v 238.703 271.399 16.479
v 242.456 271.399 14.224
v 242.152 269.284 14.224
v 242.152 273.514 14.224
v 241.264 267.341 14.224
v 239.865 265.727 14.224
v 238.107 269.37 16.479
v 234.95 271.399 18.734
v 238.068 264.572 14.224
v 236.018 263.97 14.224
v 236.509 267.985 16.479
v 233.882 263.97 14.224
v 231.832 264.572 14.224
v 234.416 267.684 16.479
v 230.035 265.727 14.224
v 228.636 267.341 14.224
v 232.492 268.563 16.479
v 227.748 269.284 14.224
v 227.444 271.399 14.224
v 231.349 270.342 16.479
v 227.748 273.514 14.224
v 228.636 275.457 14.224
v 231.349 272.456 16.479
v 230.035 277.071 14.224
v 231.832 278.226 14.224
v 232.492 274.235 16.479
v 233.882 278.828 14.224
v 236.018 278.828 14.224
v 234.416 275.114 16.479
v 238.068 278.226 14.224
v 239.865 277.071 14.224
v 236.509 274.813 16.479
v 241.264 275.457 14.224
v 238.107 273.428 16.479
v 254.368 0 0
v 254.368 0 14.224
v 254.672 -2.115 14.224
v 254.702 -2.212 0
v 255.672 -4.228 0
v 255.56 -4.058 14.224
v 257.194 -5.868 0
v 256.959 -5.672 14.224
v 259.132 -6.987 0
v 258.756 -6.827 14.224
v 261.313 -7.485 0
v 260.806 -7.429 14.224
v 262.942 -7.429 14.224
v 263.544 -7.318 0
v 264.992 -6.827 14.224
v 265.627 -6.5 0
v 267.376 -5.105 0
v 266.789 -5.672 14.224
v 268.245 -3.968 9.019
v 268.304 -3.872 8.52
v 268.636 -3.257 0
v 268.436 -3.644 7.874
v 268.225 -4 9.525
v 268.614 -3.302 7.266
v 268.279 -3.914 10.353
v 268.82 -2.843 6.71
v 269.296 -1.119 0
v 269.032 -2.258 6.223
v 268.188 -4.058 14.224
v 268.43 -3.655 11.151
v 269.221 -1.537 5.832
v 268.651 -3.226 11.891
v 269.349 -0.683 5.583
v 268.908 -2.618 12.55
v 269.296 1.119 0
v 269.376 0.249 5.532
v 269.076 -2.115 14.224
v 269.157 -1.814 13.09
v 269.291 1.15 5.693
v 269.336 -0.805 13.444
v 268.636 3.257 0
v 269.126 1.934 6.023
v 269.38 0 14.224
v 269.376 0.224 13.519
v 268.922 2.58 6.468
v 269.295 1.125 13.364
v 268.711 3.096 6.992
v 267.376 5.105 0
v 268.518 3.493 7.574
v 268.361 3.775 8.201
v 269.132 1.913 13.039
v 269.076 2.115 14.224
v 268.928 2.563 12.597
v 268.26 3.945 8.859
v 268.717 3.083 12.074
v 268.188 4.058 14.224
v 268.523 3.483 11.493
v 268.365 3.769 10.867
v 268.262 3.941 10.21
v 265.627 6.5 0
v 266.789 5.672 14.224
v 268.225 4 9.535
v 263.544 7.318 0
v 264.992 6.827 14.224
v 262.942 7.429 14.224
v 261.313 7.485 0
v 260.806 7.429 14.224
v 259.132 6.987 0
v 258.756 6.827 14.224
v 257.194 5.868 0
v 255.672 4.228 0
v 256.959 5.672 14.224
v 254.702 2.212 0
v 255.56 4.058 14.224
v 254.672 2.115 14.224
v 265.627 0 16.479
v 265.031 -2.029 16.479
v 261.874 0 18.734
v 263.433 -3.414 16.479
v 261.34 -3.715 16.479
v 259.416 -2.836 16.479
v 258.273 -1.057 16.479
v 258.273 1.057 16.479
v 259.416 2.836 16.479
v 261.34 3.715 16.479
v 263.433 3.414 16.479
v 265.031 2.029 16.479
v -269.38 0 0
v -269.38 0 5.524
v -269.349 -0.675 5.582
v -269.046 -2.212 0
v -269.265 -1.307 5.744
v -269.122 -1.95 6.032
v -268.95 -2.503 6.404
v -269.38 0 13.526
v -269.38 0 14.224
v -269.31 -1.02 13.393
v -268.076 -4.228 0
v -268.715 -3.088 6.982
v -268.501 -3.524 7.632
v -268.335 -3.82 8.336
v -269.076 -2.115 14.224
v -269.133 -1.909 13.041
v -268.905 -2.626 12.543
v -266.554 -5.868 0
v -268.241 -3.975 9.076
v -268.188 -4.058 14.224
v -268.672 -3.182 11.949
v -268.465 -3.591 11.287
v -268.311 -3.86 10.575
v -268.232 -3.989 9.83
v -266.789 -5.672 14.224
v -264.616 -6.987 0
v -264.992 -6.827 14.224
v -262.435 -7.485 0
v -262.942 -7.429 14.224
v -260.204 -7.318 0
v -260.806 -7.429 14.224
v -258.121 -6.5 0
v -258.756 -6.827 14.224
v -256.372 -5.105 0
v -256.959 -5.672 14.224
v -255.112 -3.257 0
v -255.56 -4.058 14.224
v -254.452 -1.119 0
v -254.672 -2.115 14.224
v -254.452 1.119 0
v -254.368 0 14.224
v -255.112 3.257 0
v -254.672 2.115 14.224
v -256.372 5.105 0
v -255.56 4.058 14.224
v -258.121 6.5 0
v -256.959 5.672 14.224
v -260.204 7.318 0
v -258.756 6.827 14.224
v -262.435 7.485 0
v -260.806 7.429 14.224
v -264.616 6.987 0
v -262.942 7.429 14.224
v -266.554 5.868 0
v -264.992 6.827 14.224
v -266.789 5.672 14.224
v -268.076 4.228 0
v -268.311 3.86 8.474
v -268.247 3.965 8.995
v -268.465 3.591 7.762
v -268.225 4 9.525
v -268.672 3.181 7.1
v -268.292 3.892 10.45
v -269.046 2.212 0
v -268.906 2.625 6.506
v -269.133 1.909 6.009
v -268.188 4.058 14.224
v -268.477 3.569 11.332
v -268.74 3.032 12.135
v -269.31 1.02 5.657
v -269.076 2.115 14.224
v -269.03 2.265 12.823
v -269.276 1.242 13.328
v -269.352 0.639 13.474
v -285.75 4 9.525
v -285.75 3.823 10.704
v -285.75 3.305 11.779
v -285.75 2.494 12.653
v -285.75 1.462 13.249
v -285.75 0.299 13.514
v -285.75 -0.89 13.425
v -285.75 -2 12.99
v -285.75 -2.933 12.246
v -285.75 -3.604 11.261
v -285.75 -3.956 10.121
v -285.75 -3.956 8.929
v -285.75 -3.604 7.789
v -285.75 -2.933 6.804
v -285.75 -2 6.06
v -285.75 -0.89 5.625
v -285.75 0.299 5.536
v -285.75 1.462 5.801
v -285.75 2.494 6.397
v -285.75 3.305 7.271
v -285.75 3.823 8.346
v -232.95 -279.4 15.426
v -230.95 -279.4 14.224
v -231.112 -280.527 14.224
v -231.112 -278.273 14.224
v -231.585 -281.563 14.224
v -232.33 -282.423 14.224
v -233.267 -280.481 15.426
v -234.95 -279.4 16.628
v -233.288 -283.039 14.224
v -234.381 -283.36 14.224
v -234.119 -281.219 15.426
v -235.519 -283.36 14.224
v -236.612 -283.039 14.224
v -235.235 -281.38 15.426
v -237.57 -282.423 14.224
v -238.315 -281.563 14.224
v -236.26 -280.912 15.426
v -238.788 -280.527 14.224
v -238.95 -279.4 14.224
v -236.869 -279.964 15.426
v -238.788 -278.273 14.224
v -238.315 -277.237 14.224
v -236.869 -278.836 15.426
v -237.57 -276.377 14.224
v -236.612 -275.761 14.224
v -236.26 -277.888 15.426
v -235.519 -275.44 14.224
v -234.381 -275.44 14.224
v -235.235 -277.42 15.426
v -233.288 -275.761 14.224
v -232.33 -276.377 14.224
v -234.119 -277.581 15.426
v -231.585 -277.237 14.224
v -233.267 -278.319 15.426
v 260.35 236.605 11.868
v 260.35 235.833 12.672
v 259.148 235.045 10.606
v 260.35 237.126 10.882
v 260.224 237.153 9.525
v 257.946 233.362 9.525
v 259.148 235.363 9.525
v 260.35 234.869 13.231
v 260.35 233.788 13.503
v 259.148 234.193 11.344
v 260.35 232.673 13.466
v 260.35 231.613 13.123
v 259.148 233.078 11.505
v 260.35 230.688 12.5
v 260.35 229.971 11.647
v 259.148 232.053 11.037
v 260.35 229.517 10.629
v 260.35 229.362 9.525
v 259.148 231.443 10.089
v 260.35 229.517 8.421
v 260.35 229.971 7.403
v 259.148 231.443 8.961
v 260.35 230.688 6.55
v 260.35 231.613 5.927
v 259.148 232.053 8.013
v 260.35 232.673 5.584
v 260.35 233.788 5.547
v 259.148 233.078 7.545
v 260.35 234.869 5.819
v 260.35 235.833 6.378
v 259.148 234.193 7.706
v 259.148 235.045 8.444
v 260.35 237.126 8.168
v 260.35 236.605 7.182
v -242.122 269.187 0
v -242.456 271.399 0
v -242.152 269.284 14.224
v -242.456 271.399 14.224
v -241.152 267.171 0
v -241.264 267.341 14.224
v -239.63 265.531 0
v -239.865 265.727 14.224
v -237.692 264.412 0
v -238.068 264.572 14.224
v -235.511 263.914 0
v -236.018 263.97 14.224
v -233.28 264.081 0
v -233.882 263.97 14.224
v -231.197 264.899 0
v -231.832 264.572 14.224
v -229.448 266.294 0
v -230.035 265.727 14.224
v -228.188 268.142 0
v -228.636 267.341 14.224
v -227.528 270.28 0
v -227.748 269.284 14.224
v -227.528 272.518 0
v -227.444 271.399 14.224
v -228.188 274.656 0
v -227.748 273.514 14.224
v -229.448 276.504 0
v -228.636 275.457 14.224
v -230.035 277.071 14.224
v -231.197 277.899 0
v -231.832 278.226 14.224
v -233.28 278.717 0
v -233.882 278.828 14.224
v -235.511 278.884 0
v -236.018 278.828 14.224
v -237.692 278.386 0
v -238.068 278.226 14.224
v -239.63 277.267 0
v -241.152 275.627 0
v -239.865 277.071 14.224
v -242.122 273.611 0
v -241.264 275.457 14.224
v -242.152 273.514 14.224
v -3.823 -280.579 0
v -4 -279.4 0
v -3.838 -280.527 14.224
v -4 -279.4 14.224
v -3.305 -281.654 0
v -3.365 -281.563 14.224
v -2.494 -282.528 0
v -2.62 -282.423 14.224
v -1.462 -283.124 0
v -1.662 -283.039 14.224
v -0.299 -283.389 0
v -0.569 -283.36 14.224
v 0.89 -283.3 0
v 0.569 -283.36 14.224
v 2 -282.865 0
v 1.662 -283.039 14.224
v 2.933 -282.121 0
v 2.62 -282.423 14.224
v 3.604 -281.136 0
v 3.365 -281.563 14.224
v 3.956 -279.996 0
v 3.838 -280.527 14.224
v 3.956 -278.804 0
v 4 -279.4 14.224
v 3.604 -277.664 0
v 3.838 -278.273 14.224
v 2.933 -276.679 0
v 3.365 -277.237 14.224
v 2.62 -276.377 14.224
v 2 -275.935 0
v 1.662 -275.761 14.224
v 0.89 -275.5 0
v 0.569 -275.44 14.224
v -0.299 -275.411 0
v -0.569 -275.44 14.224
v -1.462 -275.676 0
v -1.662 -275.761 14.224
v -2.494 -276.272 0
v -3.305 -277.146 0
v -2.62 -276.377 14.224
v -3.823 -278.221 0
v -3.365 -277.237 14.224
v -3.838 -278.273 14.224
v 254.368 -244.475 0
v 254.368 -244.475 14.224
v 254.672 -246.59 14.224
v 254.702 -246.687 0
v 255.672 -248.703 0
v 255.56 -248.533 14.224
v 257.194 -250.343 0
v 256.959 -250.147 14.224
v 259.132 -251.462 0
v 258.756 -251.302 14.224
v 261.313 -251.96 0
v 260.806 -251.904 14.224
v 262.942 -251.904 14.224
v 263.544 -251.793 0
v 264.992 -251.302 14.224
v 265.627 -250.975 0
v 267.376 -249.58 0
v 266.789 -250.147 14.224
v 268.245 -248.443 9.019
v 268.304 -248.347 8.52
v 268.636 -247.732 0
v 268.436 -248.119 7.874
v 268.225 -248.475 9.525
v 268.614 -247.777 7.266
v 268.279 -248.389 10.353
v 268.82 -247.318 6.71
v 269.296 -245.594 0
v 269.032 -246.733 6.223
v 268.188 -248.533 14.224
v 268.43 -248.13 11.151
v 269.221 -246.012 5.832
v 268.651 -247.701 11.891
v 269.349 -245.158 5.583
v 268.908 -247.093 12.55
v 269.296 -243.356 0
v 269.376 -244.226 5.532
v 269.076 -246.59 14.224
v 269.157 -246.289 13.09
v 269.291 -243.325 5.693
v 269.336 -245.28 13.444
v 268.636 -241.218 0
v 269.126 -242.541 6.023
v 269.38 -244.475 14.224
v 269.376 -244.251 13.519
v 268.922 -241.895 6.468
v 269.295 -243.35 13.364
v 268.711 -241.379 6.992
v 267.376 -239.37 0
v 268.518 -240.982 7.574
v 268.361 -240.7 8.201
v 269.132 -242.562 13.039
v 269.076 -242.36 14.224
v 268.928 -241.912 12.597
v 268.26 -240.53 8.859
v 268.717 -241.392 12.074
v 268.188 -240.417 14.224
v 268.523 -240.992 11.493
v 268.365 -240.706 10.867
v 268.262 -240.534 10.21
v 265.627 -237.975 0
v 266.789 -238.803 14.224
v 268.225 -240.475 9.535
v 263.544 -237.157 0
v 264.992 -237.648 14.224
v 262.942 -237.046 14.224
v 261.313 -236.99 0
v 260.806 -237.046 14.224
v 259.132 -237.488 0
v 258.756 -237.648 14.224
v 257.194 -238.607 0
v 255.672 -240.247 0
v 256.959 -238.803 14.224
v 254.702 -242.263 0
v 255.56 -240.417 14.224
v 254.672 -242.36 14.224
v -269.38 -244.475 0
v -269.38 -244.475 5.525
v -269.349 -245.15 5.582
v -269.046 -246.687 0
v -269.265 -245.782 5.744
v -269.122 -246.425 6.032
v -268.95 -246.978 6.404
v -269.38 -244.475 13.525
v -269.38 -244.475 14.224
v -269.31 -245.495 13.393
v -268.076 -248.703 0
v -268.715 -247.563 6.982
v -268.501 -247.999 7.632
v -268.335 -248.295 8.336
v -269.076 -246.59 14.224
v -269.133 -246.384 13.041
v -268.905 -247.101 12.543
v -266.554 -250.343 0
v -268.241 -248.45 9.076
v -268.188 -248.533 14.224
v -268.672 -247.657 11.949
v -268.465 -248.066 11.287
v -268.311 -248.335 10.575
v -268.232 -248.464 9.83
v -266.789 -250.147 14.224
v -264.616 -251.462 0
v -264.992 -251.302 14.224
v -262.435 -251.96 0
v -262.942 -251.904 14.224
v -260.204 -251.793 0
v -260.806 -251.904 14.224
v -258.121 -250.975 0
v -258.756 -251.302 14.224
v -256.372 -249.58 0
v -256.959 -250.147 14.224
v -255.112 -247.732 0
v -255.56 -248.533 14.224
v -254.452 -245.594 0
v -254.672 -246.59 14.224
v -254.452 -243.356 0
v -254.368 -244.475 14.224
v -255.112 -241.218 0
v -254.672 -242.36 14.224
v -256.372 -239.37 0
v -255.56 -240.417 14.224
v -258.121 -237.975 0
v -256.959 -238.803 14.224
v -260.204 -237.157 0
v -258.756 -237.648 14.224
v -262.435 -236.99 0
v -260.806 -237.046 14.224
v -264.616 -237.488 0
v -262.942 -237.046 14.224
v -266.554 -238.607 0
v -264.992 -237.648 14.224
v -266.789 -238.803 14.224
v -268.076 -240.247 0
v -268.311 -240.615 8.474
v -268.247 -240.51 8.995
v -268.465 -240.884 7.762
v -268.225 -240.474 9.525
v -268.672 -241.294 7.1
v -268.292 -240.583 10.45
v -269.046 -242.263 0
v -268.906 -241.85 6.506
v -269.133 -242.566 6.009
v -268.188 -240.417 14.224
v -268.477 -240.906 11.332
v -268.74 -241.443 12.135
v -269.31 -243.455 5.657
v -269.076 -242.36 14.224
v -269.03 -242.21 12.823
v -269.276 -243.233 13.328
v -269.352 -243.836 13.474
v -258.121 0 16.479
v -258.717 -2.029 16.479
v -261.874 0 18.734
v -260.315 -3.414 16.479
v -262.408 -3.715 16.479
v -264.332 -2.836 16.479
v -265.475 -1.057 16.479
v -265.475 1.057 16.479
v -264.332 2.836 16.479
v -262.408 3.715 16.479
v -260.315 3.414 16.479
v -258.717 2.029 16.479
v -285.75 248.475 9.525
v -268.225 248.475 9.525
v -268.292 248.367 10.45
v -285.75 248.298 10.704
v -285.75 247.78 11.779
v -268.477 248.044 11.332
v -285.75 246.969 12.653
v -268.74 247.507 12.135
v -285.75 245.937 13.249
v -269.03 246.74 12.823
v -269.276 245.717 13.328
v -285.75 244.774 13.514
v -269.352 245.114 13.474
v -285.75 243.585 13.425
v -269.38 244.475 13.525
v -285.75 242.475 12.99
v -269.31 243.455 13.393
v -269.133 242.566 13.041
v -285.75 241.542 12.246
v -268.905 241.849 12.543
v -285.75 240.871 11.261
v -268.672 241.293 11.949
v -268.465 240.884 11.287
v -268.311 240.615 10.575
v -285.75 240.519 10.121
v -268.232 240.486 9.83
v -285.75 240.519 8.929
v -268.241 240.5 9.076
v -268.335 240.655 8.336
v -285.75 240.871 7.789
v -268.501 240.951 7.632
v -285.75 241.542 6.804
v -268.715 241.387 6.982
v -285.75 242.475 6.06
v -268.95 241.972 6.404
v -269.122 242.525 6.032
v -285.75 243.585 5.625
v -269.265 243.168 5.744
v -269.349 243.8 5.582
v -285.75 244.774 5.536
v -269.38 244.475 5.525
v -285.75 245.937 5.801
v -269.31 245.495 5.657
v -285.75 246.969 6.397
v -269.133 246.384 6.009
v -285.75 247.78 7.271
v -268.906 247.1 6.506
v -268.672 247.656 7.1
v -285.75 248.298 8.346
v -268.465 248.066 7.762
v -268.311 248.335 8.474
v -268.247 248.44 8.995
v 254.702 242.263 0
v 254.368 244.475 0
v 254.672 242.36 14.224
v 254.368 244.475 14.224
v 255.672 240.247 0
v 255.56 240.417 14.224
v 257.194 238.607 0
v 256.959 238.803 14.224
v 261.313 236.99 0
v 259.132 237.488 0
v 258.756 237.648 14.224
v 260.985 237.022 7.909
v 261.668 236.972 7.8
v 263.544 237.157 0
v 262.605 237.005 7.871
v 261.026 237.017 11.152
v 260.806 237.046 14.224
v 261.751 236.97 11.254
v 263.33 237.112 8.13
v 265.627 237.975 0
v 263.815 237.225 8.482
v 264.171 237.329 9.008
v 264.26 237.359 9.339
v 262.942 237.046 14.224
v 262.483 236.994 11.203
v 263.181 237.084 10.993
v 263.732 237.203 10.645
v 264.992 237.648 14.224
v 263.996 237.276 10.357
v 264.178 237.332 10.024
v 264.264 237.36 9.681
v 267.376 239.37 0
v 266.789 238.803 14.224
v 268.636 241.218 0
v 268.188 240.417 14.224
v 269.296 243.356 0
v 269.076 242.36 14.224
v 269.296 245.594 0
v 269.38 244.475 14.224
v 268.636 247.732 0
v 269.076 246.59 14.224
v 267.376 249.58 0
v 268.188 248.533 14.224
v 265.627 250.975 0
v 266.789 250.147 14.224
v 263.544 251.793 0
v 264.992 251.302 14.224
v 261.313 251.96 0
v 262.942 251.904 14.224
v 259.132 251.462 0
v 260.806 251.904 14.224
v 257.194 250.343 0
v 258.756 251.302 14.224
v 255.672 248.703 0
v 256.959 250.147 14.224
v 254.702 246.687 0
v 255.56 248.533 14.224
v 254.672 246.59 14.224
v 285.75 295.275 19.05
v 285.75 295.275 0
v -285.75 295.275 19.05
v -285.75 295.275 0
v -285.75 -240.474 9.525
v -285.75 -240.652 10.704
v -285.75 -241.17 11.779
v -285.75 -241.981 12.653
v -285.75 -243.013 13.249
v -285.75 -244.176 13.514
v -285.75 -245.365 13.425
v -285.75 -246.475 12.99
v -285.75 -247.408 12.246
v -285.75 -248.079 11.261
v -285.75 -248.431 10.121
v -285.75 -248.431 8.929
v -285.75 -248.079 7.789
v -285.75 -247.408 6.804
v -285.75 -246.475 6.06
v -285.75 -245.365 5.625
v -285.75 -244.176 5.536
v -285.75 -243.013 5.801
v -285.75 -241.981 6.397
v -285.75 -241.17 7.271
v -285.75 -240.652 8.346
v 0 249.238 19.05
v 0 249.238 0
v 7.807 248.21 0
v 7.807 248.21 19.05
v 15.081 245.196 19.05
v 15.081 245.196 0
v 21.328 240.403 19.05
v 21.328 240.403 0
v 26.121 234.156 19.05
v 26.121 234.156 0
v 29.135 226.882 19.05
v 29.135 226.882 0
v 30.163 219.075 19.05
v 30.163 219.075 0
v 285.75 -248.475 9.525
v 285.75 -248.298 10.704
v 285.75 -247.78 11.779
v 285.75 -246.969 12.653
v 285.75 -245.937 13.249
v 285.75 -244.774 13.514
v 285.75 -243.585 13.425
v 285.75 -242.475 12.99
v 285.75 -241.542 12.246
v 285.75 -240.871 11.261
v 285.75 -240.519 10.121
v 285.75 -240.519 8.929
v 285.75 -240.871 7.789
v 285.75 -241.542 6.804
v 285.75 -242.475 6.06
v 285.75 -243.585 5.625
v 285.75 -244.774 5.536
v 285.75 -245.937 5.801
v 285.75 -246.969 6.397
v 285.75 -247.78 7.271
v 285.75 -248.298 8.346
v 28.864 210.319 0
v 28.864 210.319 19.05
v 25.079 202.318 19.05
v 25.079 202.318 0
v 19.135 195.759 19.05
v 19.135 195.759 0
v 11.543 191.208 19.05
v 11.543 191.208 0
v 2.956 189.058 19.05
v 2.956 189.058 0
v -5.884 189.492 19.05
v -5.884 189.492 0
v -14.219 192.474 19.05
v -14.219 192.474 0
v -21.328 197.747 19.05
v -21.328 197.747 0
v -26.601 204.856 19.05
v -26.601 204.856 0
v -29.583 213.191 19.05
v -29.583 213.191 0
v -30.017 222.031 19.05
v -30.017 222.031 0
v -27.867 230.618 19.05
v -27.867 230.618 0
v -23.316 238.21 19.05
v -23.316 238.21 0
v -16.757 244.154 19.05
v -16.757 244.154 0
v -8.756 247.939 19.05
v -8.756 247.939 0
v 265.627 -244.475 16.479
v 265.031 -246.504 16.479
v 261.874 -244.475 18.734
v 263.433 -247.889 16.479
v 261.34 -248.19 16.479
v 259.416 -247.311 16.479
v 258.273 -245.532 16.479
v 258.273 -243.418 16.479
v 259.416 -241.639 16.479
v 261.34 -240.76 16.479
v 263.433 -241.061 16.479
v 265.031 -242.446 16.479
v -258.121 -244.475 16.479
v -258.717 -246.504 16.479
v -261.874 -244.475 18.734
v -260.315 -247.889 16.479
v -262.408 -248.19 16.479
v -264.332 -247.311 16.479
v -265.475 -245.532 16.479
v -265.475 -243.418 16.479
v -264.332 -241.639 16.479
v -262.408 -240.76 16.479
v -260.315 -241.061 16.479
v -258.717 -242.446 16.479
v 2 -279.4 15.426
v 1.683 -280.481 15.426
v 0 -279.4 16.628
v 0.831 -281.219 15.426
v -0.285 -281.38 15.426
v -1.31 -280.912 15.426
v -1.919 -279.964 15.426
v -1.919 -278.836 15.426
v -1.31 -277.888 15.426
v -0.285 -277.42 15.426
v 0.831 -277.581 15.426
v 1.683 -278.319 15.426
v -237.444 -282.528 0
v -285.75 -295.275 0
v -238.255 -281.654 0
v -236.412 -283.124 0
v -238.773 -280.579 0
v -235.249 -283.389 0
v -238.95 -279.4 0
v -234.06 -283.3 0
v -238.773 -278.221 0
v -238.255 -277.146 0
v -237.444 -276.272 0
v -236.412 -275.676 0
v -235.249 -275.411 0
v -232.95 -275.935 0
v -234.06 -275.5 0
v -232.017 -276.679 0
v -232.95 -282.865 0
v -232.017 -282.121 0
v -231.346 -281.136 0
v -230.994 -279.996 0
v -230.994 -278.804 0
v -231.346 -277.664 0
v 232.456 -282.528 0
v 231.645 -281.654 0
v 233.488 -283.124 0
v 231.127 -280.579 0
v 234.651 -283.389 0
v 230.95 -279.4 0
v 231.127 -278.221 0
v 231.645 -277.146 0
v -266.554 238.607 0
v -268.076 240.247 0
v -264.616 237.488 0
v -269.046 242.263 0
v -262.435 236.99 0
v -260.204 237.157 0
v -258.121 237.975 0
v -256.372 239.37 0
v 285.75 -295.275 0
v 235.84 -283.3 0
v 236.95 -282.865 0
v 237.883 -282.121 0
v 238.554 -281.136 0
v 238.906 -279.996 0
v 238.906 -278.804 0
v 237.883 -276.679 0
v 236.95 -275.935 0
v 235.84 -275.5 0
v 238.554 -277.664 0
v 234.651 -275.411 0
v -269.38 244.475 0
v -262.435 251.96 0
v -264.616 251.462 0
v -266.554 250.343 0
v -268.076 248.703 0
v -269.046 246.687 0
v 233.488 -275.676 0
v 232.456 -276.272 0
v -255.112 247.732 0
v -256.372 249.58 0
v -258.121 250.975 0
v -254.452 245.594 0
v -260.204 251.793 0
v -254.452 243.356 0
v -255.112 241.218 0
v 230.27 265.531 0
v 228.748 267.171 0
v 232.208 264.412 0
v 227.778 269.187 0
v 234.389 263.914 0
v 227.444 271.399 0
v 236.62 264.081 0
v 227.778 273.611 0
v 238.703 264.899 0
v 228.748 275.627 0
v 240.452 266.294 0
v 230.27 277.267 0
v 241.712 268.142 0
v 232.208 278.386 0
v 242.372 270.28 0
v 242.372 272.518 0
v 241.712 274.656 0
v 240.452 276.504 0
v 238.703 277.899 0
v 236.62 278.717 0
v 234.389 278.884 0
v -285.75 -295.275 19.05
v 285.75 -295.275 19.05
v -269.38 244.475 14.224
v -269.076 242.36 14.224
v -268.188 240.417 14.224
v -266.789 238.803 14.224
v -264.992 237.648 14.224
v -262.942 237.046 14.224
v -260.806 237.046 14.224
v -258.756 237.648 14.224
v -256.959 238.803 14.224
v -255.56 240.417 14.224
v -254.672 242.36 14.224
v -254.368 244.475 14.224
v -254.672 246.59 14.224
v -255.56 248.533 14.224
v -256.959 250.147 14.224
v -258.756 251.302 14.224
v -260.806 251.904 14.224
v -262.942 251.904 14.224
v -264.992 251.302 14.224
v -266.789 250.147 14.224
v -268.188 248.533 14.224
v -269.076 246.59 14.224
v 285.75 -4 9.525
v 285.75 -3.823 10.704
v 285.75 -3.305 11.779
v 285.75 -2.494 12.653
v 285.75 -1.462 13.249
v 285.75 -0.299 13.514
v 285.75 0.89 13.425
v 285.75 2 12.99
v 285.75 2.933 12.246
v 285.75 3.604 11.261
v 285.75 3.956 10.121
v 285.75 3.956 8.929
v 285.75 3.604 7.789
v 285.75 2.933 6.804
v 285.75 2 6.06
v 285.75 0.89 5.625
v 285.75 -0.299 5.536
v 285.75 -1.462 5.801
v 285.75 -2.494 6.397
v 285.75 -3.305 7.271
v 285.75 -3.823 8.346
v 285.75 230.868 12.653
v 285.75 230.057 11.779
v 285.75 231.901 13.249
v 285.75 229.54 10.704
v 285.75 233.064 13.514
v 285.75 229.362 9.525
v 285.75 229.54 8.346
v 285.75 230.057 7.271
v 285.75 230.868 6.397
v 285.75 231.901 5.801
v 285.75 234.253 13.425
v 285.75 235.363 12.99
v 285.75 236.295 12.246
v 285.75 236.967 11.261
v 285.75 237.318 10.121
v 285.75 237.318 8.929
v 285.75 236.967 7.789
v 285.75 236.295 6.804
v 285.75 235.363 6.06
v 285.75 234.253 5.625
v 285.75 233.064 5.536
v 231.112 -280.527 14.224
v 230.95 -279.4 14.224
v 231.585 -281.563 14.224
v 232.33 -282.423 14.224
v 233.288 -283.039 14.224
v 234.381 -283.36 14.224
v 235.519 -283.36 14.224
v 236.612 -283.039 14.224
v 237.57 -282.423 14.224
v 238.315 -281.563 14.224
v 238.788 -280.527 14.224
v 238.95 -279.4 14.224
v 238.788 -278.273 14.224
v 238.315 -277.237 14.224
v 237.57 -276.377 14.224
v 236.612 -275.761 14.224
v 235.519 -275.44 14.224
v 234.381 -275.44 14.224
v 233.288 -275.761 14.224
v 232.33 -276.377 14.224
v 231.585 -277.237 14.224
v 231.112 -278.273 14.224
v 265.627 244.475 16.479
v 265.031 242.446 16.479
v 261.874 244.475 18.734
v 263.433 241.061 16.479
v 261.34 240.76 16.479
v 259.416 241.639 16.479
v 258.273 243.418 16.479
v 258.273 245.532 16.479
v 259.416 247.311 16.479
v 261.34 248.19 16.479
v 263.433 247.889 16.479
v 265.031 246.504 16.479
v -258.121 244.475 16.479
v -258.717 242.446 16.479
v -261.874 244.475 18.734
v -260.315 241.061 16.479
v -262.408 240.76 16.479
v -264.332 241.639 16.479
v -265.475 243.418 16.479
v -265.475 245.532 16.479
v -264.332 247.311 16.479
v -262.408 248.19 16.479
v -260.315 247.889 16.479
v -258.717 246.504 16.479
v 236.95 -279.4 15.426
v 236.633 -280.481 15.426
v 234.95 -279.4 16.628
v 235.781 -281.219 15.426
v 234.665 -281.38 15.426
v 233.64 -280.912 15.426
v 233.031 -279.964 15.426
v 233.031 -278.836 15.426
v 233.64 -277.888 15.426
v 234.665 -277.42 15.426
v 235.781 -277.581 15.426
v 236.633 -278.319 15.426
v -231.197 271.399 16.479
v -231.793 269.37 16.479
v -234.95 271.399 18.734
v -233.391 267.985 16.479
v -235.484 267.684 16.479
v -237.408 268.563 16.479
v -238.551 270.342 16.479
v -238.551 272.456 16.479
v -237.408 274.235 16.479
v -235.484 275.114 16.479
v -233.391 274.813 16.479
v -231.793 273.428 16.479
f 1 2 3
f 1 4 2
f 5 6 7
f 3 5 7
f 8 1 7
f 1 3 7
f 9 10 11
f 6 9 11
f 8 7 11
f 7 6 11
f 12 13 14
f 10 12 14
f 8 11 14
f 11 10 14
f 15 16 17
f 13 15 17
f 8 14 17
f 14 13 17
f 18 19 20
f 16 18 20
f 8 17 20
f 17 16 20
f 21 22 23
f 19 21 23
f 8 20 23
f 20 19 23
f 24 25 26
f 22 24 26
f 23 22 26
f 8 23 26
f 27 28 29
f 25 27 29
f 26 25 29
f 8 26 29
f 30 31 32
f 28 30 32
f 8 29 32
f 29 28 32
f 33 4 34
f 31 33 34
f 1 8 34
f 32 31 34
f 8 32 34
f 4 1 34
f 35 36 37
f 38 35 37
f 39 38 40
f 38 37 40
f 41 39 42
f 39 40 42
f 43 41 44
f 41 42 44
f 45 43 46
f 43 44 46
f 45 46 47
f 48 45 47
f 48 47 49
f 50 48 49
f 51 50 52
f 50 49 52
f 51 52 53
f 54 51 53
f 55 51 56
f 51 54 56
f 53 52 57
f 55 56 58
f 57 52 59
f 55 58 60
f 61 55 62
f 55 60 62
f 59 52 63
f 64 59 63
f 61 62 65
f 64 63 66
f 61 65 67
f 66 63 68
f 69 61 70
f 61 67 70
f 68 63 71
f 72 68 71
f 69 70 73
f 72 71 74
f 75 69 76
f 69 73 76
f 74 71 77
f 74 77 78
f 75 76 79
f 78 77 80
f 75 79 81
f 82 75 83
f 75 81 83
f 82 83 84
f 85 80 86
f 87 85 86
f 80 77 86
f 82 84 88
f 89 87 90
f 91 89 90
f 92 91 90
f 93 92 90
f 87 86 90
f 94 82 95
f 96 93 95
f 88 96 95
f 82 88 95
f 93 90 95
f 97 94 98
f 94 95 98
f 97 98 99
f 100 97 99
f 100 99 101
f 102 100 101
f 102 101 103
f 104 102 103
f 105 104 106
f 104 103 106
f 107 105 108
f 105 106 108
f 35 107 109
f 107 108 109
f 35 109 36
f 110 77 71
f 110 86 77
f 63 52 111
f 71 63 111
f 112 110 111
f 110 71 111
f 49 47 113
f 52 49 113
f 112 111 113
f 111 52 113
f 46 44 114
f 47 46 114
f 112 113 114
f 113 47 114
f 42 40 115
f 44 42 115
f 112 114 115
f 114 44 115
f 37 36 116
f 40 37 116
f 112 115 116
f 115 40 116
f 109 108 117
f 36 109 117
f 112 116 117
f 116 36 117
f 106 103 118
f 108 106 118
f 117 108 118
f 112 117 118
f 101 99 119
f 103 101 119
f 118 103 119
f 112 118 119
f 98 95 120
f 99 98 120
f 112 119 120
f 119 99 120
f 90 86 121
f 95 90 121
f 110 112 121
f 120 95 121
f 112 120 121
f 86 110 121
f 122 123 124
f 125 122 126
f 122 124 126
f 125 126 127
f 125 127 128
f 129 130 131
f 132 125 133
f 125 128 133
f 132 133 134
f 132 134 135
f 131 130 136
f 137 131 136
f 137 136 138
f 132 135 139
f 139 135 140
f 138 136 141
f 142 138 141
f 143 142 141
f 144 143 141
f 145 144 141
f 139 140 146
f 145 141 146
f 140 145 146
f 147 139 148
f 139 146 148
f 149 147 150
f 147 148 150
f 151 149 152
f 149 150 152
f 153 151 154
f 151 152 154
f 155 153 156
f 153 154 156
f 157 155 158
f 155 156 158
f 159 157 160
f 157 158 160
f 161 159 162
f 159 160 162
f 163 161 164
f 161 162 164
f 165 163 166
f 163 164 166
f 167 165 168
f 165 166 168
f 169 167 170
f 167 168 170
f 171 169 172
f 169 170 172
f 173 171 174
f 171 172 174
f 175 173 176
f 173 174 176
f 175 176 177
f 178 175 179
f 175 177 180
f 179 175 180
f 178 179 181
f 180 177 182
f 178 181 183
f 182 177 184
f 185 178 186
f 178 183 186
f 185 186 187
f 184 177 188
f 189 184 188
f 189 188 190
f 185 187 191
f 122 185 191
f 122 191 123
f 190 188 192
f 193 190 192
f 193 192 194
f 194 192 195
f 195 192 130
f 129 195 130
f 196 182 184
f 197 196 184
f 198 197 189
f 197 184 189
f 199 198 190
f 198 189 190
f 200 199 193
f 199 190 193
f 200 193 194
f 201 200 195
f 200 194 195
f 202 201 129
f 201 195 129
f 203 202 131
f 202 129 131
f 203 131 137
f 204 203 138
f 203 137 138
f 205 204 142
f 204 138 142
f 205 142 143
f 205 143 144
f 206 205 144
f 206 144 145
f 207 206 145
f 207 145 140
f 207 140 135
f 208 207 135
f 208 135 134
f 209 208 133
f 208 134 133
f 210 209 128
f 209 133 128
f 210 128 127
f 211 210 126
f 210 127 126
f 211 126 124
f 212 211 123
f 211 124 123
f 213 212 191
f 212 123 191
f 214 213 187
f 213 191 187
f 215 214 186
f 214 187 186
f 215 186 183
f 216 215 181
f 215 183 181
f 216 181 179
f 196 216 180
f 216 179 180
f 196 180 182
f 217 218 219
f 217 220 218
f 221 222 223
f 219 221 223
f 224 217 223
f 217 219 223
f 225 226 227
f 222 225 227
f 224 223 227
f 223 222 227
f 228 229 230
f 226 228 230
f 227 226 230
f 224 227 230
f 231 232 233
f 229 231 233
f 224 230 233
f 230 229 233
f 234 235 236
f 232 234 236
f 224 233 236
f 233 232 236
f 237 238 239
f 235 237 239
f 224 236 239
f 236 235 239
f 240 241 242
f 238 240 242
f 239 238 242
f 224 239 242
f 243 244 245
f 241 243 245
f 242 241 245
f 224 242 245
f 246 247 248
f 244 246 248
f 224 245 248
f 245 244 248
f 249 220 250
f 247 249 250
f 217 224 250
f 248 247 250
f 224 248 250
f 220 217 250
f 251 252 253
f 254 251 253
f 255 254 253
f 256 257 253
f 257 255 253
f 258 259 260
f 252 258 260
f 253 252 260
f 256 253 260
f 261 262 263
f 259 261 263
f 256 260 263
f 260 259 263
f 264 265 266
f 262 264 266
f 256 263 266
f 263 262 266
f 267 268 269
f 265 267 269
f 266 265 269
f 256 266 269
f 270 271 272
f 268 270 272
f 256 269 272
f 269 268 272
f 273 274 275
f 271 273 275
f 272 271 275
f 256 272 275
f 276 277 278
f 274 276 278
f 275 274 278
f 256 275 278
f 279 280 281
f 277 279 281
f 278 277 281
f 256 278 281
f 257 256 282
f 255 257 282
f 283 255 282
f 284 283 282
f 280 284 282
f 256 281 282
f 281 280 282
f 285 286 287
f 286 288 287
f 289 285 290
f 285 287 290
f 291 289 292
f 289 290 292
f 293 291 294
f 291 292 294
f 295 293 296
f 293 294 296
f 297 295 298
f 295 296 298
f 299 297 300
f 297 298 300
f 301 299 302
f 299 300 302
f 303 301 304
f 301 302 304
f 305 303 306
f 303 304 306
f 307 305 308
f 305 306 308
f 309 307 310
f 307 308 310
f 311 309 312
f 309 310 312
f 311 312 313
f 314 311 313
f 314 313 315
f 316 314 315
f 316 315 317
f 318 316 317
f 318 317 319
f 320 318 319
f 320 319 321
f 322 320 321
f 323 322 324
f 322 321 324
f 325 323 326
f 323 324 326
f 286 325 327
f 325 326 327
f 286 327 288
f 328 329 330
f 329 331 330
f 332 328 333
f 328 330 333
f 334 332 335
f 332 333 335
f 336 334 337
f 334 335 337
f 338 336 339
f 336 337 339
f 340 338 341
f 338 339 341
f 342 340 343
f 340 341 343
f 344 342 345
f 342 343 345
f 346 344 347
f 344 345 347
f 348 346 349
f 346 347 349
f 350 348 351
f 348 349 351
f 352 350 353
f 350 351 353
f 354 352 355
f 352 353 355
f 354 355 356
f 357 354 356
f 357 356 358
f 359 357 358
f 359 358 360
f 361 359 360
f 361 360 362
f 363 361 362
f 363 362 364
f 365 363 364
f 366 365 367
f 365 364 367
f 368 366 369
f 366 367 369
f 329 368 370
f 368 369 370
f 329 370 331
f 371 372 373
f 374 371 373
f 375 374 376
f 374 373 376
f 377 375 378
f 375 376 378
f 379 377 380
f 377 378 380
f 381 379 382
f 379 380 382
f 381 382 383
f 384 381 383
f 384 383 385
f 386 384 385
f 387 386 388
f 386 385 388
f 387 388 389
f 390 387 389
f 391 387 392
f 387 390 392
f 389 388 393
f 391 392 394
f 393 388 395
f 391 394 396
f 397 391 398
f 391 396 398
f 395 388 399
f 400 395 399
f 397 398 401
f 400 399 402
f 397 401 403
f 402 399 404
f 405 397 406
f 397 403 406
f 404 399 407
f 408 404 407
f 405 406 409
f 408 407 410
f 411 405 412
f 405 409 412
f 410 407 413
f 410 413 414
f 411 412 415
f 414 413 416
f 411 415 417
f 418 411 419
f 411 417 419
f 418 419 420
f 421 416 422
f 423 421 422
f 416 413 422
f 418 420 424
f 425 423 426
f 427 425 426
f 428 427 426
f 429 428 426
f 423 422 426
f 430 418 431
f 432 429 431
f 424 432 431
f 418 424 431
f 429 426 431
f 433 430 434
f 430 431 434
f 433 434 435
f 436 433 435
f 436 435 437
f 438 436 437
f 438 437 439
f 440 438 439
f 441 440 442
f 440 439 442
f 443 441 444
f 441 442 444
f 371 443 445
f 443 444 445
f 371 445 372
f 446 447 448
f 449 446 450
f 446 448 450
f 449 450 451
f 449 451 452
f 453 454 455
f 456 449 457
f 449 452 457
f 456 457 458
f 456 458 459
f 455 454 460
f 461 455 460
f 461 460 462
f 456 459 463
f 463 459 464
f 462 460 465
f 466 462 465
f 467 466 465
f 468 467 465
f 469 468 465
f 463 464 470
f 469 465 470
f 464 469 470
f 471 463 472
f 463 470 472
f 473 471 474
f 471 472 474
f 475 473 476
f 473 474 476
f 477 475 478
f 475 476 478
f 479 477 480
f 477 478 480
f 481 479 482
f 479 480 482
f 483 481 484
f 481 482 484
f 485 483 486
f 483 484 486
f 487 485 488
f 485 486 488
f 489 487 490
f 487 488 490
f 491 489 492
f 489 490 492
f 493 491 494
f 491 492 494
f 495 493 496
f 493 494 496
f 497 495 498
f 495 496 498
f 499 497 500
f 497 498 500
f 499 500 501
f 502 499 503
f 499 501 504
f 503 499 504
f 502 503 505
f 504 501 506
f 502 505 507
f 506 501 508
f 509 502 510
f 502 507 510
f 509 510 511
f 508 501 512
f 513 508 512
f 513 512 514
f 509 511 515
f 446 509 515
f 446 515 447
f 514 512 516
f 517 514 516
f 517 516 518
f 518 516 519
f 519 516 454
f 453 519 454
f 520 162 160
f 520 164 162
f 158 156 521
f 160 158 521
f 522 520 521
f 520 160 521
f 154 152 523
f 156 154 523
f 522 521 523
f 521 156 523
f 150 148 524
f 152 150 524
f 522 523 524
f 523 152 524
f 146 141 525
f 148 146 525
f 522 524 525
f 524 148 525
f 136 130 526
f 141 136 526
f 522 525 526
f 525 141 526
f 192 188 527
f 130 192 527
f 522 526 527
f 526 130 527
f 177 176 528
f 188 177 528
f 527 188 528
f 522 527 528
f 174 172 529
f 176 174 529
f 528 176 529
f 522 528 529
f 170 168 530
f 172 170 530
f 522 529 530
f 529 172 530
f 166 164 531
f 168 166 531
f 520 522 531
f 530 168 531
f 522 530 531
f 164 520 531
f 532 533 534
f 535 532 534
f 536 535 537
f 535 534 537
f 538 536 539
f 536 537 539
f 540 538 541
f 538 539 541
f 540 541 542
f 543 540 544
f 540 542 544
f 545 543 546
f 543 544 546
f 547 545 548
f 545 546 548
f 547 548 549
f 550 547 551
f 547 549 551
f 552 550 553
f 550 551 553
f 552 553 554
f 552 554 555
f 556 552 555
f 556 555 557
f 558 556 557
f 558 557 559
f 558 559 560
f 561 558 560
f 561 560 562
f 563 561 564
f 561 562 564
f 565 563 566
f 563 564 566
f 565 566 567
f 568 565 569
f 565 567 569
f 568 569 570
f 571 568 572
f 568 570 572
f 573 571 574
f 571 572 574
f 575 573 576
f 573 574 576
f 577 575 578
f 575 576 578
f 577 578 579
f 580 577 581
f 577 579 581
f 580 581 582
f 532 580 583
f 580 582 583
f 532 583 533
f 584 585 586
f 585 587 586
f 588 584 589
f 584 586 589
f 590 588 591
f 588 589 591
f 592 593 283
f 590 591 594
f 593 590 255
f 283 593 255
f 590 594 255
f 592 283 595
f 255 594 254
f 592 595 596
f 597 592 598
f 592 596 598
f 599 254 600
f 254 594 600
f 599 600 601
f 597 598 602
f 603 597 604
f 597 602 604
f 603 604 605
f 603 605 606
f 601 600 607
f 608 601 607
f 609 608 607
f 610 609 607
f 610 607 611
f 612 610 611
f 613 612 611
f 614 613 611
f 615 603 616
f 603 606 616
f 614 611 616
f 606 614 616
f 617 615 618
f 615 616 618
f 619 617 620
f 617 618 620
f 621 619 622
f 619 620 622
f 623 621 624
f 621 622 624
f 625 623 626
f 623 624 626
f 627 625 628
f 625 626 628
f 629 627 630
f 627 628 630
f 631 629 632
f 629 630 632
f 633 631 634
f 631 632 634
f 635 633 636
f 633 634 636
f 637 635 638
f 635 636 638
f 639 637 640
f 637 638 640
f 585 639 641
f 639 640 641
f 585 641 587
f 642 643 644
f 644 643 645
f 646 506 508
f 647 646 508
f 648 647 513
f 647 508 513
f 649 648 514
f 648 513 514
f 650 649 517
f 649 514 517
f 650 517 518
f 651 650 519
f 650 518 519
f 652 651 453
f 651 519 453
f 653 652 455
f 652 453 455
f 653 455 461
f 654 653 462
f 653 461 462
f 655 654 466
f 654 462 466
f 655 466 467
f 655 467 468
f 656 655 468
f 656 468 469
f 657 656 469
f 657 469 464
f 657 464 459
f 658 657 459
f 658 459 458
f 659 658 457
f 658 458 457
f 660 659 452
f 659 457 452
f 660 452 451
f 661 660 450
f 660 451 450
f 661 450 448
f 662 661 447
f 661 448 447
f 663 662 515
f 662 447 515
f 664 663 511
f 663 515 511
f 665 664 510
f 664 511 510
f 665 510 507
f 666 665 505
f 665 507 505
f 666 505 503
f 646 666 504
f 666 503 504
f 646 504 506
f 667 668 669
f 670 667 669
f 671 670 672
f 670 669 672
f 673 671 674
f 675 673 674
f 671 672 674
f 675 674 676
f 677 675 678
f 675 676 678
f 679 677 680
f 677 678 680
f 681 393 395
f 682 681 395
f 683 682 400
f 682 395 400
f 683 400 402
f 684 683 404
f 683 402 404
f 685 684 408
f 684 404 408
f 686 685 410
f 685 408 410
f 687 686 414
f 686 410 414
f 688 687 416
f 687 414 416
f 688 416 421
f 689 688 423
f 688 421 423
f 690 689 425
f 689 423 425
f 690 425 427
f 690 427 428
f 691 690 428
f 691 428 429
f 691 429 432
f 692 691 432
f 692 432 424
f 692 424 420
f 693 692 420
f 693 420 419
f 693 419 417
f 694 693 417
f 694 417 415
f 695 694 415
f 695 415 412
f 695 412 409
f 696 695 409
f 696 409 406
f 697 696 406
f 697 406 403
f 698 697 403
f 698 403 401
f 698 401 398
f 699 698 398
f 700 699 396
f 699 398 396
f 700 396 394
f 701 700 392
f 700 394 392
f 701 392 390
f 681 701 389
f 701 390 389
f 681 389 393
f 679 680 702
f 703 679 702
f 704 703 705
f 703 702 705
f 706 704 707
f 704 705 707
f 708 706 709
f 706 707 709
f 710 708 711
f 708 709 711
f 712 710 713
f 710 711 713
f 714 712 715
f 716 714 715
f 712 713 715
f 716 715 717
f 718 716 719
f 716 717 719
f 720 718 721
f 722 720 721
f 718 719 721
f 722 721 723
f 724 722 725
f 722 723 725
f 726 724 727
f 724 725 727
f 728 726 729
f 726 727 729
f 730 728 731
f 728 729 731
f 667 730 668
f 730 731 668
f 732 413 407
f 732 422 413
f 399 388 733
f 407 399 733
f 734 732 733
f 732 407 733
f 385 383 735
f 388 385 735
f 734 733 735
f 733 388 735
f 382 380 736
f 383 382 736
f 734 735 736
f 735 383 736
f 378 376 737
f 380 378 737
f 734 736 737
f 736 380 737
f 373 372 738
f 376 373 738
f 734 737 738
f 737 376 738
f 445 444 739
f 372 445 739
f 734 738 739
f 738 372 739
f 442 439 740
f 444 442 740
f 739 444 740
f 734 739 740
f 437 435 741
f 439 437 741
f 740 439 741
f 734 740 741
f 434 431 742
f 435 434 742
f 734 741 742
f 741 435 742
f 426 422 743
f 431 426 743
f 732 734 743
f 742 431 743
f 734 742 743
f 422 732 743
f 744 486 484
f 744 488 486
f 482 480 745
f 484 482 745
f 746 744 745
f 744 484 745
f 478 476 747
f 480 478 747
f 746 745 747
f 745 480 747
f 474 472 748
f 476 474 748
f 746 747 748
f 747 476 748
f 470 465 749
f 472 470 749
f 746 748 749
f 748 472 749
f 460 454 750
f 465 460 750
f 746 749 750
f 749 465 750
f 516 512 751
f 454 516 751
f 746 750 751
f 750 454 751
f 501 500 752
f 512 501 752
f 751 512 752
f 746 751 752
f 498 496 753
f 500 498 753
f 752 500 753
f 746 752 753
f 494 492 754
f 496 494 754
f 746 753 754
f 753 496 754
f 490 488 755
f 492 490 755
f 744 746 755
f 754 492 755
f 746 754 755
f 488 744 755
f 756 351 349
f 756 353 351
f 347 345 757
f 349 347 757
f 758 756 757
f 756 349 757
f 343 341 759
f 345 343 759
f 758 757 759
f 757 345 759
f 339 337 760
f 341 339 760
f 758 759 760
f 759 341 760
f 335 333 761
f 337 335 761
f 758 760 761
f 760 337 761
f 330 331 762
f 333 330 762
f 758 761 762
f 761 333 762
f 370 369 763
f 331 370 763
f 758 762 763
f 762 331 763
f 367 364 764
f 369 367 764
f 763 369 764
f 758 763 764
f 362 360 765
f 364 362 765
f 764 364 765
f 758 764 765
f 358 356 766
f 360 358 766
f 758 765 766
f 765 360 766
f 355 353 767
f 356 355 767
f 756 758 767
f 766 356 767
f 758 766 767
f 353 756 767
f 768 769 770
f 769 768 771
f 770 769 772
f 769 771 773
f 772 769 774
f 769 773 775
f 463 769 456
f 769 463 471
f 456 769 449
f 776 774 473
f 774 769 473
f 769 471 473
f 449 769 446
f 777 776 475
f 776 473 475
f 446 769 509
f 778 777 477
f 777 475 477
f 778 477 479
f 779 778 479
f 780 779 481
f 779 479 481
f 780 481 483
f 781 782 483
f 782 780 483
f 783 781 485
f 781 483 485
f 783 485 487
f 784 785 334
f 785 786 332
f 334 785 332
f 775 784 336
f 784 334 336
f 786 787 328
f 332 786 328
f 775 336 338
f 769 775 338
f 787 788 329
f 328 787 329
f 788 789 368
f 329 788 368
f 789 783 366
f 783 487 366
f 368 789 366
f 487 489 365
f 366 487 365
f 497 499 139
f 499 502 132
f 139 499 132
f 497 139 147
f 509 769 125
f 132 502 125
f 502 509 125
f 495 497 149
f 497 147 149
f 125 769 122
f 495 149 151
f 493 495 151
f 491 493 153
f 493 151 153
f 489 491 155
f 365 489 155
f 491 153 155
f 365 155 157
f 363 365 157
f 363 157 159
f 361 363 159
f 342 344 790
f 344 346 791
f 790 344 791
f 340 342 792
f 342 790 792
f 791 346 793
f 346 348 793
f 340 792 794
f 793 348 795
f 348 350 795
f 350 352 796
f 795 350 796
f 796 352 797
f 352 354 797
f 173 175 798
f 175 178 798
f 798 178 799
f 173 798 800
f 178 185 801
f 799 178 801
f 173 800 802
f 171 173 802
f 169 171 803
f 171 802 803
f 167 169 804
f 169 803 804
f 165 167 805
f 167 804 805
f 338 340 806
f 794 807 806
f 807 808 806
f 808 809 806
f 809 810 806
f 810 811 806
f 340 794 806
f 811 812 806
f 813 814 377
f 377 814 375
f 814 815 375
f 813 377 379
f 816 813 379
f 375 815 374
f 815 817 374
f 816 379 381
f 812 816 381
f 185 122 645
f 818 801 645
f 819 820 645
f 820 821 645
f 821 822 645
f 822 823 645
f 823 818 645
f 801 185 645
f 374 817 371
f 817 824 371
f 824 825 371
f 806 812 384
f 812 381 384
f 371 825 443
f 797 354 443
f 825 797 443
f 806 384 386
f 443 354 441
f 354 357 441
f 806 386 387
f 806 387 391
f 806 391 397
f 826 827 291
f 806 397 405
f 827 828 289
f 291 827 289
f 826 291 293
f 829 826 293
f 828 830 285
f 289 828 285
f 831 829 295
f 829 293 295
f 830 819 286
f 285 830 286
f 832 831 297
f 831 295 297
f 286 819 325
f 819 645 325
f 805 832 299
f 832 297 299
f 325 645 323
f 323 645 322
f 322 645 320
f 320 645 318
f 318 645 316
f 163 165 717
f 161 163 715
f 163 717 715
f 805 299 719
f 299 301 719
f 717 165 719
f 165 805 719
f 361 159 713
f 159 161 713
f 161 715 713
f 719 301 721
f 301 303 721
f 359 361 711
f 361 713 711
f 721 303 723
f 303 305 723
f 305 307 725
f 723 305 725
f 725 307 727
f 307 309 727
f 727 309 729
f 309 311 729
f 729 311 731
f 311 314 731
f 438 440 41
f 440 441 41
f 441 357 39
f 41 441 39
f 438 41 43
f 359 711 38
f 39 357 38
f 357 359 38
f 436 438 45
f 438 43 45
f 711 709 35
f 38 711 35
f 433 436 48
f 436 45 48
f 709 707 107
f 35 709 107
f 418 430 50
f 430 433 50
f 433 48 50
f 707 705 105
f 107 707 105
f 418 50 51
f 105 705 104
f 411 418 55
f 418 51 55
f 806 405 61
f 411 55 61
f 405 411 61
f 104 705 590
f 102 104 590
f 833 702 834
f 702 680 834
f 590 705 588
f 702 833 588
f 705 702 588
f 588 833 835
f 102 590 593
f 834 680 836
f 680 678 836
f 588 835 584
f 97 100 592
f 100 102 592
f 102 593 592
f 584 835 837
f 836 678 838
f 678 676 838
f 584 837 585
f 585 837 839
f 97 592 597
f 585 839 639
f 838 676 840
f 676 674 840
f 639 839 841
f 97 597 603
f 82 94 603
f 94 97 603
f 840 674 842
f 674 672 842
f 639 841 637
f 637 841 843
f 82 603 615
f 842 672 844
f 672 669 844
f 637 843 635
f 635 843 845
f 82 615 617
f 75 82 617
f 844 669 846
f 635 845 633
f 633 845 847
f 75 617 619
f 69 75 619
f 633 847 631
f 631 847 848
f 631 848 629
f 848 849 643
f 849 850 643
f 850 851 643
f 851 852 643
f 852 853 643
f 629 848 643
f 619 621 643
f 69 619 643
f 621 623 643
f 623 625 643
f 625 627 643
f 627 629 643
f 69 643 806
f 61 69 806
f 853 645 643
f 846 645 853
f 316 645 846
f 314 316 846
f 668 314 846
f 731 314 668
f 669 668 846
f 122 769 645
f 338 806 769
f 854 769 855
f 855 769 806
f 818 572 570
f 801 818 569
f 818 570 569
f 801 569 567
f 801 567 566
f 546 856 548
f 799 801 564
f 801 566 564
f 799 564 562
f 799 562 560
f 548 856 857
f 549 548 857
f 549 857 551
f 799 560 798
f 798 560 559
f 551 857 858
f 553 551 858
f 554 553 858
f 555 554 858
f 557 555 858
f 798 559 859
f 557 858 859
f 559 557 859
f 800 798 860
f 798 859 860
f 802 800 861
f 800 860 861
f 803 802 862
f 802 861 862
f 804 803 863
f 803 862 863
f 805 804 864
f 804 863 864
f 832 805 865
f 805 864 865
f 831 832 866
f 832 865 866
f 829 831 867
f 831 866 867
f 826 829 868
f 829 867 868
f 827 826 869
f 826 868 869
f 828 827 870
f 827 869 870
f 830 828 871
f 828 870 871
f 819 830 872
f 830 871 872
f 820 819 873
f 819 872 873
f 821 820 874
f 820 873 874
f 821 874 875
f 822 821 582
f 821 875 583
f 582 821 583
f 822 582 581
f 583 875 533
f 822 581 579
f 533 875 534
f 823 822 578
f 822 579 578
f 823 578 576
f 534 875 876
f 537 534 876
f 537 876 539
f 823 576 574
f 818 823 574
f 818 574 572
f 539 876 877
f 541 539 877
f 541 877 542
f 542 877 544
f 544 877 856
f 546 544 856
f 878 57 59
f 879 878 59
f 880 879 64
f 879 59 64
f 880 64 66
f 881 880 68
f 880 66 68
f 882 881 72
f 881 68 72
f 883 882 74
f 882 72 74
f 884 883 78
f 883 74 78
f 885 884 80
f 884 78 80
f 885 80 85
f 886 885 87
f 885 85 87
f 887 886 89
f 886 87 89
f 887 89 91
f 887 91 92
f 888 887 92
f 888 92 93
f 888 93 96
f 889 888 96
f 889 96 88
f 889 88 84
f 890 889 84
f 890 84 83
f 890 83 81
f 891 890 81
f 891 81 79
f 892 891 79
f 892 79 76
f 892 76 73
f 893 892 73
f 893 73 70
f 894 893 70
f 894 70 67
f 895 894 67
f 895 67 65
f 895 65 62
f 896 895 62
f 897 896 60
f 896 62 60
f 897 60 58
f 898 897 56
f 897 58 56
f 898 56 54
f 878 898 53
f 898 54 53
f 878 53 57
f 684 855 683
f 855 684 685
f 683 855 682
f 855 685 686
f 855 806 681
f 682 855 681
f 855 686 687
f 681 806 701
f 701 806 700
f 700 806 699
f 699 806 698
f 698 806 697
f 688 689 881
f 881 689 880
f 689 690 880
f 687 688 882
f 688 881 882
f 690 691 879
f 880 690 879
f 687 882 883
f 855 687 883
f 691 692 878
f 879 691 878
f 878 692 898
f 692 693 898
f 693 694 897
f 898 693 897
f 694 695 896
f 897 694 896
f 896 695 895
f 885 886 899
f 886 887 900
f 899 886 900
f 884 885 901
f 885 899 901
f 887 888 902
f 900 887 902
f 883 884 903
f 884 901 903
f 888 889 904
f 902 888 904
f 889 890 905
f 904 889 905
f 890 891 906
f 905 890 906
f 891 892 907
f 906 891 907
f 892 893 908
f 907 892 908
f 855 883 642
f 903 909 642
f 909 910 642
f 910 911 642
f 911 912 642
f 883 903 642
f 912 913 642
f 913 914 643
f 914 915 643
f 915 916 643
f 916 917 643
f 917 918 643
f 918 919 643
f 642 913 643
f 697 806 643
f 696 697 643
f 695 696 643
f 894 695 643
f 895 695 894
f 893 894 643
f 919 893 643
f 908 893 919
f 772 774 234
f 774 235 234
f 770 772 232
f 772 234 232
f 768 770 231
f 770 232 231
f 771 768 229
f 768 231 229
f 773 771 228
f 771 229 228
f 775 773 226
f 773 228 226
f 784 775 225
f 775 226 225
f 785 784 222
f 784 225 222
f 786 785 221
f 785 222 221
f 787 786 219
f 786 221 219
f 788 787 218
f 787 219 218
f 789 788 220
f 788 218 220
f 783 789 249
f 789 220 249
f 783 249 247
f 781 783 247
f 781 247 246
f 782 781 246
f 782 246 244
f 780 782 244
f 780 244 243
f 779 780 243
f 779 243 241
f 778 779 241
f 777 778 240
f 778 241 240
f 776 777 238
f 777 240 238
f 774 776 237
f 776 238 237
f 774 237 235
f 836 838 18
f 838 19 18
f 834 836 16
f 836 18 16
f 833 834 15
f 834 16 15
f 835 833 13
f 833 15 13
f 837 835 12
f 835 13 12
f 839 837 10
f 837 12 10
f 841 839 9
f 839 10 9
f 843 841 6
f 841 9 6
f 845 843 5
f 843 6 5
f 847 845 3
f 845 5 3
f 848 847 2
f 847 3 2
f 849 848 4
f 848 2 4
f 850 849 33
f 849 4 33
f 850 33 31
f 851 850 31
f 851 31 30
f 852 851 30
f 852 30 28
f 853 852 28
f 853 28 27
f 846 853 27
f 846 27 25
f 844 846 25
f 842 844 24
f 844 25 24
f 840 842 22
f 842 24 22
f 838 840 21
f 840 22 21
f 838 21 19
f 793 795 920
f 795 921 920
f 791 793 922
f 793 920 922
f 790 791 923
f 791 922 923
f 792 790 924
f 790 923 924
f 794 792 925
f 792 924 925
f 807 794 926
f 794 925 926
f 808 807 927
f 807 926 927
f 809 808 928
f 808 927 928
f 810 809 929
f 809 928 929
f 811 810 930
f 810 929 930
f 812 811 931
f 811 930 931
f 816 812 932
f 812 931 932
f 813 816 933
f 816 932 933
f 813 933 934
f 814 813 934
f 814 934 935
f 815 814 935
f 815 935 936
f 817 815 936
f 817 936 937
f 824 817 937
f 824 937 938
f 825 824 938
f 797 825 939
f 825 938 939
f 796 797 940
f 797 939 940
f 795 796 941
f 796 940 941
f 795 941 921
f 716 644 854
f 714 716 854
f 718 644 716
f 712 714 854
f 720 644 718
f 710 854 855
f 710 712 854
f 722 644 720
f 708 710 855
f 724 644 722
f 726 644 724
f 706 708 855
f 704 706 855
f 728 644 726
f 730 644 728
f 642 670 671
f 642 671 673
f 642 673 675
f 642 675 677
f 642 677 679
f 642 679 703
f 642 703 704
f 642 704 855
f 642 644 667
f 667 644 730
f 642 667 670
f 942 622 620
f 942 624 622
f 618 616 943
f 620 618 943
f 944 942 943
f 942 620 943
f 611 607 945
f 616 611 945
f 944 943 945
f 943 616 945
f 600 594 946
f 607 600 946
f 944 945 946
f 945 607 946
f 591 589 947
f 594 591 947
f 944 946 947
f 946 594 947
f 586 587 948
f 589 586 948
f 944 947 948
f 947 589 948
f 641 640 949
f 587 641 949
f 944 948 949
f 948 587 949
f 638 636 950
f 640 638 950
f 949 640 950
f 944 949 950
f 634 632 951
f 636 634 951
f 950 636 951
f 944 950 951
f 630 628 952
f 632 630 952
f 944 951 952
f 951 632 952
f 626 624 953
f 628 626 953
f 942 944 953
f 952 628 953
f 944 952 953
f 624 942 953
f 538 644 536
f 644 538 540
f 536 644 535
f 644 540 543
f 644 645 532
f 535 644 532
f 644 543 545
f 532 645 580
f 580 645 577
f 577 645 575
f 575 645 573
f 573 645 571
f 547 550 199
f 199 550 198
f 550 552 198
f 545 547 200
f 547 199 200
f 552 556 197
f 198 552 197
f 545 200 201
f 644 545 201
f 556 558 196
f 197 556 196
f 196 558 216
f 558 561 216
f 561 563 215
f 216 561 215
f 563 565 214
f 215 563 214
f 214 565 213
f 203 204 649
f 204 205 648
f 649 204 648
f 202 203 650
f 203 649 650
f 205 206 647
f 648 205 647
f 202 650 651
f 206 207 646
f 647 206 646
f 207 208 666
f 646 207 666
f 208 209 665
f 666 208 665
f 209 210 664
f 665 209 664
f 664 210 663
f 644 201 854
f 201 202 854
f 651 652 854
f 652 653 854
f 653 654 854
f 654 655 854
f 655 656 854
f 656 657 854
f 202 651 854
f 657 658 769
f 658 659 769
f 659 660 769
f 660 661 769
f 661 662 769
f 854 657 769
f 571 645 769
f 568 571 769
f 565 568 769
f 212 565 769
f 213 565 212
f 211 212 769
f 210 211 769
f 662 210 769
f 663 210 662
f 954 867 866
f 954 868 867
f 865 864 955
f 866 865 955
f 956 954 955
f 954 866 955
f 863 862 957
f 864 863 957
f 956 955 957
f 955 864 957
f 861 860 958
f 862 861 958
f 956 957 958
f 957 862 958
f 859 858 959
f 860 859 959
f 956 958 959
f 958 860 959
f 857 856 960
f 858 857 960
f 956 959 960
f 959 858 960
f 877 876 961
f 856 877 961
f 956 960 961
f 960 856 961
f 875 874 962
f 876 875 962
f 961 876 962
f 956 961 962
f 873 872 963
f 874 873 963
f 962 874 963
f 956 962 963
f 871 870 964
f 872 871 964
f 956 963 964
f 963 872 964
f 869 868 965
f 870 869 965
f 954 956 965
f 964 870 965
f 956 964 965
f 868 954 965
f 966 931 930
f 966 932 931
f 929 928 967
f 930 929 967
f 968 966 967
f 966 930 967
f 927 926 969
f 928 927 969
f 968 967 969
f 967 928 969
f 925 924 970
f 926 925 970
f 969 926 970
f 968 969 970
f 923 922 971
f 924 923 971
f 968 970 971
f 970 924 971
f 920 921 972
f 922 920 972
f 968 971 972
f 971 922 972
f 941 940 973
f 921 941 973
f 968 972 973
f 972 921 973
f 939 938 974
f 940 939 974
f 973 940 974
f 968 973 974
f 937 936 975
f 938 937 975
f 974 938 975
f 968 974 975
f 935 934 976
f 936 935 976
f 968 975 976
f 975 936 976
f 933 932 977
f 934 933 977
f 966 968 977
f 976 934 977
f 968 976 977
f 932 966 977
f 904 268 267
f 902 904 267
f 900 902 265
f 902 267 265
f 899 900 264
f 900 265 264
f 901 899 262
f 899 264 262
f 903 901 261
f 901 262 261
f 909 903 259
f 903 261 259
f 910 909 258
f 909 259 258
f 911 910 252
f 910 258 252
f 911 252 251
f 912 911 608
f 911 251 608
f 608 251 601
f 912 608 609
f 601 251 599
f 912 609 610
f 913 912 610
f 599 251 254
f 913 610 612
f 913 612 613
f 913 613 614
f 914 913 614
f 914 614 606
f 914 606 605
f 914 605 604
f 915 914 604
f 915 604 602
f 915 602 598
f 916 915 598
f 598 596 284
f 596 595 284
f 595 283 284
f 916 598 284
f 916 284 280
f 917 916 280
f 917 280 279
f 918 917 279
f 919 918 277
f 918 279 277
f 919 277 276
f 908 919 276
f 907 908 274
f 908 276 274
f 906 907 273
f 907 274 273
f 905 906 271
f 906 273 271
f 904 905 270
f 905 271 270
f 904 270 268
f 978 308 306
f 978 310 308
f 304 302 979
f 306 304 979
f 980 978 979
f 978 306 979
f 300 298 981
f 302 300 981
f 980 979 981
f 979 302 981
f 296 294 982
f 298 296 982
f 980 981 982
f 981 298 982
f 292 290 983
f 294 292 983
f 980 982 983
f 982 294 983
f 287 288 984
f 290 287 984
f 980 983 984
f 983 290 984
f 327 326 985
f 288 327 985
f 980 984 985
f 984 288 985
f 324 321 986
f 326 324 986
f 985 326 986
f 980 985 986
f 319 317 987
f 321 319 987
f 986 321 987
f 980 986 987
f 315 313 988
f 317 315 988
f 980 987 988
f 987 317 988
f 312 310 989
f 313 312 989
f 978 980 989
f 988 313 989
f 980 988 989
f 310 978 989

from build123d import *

# Parameters (mm, degrees)
F1_DEPTH  = 19.05
F3_D      = 15.0114
F3_DEPTH  = 14.224
F3_TIP    = 4.5098795482
F5_D      = 8.001
F5_DEPTH  = 25.4
F5_TIP    = 2.4037429064
F7_D      = 8.001
F7_DEPTH  = 25.4
F7_TIP    = 2.4037429064
F9_D      = 8.001
F9_DEPTH  = 14.224
F9_TIP    = 2.4037429064
F11_D     = 15.0114
F11_DEPTH = 14.224
F11_TIP   = 4.5098795482


# Not quite as in the source:
# - a feature names something its author has since deleted; it is built from what else it names


with BuildPart() as f1:
    # F0 (on Top) → F1 (new body)
    with BuildSketch(Plane.XY):
        Polygon((285.75, -295.275), (285.75, 295.275), (0, 295.275), (-285.75, 295.275), (-285.75, -295.275), align=None)
        with BuildLine():
            ThreePointArc((30.1625, 219.075), (-21.3281082875, 197.7468917125), (0, 249.2375))
            ThreePointArc((0, 249.2375), (21.3281082875, 240.4031082875), (30.1625, 219.075))
        make_face(mode=Mode.SUBTRACT)
    extrude(amount=F1_DEPTH)

    # F3
    with Locations(Plane(origin=(0, 0, 0), x_dir=(1, 0, 0), z_dir=(0, 0, -1))):
        with Locations((-261.874, 244.475), (261.874, 244.475), (-261.874, 0), (261.874, 0), (261.874, -244.475), (-261.874, -244.475)):
            Hole(F3_D / 2, depth=F3_DEPTH)
            with Locations((0, 0, -(F3_DEPTH + F3_TIP / 2))):  # 118° drill point
                Cone(0, F3_D / 2, F3_TIP, mode=Mode.SUBTRACT)

    # F5
    with Locations(Plane.YZ.offset(285.75)):
        with Locations((-244.475, 9.525), (0, 9.525), (233.3625, 9.525)):
            Hole(F5_D / 2, depth=F5_DEPTH)
            with Locations((0, 0, -(F5_DEPTH + F5_TIP / 2))):  # 118° drill point
                Cone(0, F5_D / 2, F5_TIP, mode=Mode.SUBTRACT)

    # F7
    with Locations(Plane(origin=(-285.75, 0, 0), x_dir=(0, -1, 0), z_dir=(-1, 0, 0))):
        with Locations((0, 9.525), (244.475, 9.525), (-244.475, 9.525)):
            Hole(F7_D / 2, depth=F7_DEPTH)
            with Locations((0, 0, -(F7_DEPTH + F7_TIP / 2))):  # 118° drill point
                Cone(0, F7_D / 2, F7_TIP, mode=Mode.SUBTRACT)

    # F9
    with Locations(Plane(origin=(0, 0, 0), x_dir=(1, 0, 0), z_dir=(0, 0, -1))):
        with Locations((-234.95, 279.4), (0, 279.4), (234.95, 279.4)):
            Hole(F9_D / 2, depth=F9_DEPTH)
            with Locations((0, 0, -(F9_DEPTH + F9_TIP / 2))):  # 118° drill point
                Cone(0, F9_D / 2, F9_TIP, mode=Mode.SUBTRACT)

    # F11
    with Locations(Plane(origin=(0, 0, 0), x_dir=(1, 0, 0), z_dir=(0, 0, -1))):
        with Locations((-234.95, -271.399), (234.95, -271.399)):
            Hole(F11_D / 2, depth=F11_DEPTH)
            with Locations((0, 0, -(F11_DEPTH + F11_TIP / 2))):  # 118° drill point
                Cone(0, F11_D / 2, F11_TIP, mode=Mode.SUBTRACT)


solid = f1.part
